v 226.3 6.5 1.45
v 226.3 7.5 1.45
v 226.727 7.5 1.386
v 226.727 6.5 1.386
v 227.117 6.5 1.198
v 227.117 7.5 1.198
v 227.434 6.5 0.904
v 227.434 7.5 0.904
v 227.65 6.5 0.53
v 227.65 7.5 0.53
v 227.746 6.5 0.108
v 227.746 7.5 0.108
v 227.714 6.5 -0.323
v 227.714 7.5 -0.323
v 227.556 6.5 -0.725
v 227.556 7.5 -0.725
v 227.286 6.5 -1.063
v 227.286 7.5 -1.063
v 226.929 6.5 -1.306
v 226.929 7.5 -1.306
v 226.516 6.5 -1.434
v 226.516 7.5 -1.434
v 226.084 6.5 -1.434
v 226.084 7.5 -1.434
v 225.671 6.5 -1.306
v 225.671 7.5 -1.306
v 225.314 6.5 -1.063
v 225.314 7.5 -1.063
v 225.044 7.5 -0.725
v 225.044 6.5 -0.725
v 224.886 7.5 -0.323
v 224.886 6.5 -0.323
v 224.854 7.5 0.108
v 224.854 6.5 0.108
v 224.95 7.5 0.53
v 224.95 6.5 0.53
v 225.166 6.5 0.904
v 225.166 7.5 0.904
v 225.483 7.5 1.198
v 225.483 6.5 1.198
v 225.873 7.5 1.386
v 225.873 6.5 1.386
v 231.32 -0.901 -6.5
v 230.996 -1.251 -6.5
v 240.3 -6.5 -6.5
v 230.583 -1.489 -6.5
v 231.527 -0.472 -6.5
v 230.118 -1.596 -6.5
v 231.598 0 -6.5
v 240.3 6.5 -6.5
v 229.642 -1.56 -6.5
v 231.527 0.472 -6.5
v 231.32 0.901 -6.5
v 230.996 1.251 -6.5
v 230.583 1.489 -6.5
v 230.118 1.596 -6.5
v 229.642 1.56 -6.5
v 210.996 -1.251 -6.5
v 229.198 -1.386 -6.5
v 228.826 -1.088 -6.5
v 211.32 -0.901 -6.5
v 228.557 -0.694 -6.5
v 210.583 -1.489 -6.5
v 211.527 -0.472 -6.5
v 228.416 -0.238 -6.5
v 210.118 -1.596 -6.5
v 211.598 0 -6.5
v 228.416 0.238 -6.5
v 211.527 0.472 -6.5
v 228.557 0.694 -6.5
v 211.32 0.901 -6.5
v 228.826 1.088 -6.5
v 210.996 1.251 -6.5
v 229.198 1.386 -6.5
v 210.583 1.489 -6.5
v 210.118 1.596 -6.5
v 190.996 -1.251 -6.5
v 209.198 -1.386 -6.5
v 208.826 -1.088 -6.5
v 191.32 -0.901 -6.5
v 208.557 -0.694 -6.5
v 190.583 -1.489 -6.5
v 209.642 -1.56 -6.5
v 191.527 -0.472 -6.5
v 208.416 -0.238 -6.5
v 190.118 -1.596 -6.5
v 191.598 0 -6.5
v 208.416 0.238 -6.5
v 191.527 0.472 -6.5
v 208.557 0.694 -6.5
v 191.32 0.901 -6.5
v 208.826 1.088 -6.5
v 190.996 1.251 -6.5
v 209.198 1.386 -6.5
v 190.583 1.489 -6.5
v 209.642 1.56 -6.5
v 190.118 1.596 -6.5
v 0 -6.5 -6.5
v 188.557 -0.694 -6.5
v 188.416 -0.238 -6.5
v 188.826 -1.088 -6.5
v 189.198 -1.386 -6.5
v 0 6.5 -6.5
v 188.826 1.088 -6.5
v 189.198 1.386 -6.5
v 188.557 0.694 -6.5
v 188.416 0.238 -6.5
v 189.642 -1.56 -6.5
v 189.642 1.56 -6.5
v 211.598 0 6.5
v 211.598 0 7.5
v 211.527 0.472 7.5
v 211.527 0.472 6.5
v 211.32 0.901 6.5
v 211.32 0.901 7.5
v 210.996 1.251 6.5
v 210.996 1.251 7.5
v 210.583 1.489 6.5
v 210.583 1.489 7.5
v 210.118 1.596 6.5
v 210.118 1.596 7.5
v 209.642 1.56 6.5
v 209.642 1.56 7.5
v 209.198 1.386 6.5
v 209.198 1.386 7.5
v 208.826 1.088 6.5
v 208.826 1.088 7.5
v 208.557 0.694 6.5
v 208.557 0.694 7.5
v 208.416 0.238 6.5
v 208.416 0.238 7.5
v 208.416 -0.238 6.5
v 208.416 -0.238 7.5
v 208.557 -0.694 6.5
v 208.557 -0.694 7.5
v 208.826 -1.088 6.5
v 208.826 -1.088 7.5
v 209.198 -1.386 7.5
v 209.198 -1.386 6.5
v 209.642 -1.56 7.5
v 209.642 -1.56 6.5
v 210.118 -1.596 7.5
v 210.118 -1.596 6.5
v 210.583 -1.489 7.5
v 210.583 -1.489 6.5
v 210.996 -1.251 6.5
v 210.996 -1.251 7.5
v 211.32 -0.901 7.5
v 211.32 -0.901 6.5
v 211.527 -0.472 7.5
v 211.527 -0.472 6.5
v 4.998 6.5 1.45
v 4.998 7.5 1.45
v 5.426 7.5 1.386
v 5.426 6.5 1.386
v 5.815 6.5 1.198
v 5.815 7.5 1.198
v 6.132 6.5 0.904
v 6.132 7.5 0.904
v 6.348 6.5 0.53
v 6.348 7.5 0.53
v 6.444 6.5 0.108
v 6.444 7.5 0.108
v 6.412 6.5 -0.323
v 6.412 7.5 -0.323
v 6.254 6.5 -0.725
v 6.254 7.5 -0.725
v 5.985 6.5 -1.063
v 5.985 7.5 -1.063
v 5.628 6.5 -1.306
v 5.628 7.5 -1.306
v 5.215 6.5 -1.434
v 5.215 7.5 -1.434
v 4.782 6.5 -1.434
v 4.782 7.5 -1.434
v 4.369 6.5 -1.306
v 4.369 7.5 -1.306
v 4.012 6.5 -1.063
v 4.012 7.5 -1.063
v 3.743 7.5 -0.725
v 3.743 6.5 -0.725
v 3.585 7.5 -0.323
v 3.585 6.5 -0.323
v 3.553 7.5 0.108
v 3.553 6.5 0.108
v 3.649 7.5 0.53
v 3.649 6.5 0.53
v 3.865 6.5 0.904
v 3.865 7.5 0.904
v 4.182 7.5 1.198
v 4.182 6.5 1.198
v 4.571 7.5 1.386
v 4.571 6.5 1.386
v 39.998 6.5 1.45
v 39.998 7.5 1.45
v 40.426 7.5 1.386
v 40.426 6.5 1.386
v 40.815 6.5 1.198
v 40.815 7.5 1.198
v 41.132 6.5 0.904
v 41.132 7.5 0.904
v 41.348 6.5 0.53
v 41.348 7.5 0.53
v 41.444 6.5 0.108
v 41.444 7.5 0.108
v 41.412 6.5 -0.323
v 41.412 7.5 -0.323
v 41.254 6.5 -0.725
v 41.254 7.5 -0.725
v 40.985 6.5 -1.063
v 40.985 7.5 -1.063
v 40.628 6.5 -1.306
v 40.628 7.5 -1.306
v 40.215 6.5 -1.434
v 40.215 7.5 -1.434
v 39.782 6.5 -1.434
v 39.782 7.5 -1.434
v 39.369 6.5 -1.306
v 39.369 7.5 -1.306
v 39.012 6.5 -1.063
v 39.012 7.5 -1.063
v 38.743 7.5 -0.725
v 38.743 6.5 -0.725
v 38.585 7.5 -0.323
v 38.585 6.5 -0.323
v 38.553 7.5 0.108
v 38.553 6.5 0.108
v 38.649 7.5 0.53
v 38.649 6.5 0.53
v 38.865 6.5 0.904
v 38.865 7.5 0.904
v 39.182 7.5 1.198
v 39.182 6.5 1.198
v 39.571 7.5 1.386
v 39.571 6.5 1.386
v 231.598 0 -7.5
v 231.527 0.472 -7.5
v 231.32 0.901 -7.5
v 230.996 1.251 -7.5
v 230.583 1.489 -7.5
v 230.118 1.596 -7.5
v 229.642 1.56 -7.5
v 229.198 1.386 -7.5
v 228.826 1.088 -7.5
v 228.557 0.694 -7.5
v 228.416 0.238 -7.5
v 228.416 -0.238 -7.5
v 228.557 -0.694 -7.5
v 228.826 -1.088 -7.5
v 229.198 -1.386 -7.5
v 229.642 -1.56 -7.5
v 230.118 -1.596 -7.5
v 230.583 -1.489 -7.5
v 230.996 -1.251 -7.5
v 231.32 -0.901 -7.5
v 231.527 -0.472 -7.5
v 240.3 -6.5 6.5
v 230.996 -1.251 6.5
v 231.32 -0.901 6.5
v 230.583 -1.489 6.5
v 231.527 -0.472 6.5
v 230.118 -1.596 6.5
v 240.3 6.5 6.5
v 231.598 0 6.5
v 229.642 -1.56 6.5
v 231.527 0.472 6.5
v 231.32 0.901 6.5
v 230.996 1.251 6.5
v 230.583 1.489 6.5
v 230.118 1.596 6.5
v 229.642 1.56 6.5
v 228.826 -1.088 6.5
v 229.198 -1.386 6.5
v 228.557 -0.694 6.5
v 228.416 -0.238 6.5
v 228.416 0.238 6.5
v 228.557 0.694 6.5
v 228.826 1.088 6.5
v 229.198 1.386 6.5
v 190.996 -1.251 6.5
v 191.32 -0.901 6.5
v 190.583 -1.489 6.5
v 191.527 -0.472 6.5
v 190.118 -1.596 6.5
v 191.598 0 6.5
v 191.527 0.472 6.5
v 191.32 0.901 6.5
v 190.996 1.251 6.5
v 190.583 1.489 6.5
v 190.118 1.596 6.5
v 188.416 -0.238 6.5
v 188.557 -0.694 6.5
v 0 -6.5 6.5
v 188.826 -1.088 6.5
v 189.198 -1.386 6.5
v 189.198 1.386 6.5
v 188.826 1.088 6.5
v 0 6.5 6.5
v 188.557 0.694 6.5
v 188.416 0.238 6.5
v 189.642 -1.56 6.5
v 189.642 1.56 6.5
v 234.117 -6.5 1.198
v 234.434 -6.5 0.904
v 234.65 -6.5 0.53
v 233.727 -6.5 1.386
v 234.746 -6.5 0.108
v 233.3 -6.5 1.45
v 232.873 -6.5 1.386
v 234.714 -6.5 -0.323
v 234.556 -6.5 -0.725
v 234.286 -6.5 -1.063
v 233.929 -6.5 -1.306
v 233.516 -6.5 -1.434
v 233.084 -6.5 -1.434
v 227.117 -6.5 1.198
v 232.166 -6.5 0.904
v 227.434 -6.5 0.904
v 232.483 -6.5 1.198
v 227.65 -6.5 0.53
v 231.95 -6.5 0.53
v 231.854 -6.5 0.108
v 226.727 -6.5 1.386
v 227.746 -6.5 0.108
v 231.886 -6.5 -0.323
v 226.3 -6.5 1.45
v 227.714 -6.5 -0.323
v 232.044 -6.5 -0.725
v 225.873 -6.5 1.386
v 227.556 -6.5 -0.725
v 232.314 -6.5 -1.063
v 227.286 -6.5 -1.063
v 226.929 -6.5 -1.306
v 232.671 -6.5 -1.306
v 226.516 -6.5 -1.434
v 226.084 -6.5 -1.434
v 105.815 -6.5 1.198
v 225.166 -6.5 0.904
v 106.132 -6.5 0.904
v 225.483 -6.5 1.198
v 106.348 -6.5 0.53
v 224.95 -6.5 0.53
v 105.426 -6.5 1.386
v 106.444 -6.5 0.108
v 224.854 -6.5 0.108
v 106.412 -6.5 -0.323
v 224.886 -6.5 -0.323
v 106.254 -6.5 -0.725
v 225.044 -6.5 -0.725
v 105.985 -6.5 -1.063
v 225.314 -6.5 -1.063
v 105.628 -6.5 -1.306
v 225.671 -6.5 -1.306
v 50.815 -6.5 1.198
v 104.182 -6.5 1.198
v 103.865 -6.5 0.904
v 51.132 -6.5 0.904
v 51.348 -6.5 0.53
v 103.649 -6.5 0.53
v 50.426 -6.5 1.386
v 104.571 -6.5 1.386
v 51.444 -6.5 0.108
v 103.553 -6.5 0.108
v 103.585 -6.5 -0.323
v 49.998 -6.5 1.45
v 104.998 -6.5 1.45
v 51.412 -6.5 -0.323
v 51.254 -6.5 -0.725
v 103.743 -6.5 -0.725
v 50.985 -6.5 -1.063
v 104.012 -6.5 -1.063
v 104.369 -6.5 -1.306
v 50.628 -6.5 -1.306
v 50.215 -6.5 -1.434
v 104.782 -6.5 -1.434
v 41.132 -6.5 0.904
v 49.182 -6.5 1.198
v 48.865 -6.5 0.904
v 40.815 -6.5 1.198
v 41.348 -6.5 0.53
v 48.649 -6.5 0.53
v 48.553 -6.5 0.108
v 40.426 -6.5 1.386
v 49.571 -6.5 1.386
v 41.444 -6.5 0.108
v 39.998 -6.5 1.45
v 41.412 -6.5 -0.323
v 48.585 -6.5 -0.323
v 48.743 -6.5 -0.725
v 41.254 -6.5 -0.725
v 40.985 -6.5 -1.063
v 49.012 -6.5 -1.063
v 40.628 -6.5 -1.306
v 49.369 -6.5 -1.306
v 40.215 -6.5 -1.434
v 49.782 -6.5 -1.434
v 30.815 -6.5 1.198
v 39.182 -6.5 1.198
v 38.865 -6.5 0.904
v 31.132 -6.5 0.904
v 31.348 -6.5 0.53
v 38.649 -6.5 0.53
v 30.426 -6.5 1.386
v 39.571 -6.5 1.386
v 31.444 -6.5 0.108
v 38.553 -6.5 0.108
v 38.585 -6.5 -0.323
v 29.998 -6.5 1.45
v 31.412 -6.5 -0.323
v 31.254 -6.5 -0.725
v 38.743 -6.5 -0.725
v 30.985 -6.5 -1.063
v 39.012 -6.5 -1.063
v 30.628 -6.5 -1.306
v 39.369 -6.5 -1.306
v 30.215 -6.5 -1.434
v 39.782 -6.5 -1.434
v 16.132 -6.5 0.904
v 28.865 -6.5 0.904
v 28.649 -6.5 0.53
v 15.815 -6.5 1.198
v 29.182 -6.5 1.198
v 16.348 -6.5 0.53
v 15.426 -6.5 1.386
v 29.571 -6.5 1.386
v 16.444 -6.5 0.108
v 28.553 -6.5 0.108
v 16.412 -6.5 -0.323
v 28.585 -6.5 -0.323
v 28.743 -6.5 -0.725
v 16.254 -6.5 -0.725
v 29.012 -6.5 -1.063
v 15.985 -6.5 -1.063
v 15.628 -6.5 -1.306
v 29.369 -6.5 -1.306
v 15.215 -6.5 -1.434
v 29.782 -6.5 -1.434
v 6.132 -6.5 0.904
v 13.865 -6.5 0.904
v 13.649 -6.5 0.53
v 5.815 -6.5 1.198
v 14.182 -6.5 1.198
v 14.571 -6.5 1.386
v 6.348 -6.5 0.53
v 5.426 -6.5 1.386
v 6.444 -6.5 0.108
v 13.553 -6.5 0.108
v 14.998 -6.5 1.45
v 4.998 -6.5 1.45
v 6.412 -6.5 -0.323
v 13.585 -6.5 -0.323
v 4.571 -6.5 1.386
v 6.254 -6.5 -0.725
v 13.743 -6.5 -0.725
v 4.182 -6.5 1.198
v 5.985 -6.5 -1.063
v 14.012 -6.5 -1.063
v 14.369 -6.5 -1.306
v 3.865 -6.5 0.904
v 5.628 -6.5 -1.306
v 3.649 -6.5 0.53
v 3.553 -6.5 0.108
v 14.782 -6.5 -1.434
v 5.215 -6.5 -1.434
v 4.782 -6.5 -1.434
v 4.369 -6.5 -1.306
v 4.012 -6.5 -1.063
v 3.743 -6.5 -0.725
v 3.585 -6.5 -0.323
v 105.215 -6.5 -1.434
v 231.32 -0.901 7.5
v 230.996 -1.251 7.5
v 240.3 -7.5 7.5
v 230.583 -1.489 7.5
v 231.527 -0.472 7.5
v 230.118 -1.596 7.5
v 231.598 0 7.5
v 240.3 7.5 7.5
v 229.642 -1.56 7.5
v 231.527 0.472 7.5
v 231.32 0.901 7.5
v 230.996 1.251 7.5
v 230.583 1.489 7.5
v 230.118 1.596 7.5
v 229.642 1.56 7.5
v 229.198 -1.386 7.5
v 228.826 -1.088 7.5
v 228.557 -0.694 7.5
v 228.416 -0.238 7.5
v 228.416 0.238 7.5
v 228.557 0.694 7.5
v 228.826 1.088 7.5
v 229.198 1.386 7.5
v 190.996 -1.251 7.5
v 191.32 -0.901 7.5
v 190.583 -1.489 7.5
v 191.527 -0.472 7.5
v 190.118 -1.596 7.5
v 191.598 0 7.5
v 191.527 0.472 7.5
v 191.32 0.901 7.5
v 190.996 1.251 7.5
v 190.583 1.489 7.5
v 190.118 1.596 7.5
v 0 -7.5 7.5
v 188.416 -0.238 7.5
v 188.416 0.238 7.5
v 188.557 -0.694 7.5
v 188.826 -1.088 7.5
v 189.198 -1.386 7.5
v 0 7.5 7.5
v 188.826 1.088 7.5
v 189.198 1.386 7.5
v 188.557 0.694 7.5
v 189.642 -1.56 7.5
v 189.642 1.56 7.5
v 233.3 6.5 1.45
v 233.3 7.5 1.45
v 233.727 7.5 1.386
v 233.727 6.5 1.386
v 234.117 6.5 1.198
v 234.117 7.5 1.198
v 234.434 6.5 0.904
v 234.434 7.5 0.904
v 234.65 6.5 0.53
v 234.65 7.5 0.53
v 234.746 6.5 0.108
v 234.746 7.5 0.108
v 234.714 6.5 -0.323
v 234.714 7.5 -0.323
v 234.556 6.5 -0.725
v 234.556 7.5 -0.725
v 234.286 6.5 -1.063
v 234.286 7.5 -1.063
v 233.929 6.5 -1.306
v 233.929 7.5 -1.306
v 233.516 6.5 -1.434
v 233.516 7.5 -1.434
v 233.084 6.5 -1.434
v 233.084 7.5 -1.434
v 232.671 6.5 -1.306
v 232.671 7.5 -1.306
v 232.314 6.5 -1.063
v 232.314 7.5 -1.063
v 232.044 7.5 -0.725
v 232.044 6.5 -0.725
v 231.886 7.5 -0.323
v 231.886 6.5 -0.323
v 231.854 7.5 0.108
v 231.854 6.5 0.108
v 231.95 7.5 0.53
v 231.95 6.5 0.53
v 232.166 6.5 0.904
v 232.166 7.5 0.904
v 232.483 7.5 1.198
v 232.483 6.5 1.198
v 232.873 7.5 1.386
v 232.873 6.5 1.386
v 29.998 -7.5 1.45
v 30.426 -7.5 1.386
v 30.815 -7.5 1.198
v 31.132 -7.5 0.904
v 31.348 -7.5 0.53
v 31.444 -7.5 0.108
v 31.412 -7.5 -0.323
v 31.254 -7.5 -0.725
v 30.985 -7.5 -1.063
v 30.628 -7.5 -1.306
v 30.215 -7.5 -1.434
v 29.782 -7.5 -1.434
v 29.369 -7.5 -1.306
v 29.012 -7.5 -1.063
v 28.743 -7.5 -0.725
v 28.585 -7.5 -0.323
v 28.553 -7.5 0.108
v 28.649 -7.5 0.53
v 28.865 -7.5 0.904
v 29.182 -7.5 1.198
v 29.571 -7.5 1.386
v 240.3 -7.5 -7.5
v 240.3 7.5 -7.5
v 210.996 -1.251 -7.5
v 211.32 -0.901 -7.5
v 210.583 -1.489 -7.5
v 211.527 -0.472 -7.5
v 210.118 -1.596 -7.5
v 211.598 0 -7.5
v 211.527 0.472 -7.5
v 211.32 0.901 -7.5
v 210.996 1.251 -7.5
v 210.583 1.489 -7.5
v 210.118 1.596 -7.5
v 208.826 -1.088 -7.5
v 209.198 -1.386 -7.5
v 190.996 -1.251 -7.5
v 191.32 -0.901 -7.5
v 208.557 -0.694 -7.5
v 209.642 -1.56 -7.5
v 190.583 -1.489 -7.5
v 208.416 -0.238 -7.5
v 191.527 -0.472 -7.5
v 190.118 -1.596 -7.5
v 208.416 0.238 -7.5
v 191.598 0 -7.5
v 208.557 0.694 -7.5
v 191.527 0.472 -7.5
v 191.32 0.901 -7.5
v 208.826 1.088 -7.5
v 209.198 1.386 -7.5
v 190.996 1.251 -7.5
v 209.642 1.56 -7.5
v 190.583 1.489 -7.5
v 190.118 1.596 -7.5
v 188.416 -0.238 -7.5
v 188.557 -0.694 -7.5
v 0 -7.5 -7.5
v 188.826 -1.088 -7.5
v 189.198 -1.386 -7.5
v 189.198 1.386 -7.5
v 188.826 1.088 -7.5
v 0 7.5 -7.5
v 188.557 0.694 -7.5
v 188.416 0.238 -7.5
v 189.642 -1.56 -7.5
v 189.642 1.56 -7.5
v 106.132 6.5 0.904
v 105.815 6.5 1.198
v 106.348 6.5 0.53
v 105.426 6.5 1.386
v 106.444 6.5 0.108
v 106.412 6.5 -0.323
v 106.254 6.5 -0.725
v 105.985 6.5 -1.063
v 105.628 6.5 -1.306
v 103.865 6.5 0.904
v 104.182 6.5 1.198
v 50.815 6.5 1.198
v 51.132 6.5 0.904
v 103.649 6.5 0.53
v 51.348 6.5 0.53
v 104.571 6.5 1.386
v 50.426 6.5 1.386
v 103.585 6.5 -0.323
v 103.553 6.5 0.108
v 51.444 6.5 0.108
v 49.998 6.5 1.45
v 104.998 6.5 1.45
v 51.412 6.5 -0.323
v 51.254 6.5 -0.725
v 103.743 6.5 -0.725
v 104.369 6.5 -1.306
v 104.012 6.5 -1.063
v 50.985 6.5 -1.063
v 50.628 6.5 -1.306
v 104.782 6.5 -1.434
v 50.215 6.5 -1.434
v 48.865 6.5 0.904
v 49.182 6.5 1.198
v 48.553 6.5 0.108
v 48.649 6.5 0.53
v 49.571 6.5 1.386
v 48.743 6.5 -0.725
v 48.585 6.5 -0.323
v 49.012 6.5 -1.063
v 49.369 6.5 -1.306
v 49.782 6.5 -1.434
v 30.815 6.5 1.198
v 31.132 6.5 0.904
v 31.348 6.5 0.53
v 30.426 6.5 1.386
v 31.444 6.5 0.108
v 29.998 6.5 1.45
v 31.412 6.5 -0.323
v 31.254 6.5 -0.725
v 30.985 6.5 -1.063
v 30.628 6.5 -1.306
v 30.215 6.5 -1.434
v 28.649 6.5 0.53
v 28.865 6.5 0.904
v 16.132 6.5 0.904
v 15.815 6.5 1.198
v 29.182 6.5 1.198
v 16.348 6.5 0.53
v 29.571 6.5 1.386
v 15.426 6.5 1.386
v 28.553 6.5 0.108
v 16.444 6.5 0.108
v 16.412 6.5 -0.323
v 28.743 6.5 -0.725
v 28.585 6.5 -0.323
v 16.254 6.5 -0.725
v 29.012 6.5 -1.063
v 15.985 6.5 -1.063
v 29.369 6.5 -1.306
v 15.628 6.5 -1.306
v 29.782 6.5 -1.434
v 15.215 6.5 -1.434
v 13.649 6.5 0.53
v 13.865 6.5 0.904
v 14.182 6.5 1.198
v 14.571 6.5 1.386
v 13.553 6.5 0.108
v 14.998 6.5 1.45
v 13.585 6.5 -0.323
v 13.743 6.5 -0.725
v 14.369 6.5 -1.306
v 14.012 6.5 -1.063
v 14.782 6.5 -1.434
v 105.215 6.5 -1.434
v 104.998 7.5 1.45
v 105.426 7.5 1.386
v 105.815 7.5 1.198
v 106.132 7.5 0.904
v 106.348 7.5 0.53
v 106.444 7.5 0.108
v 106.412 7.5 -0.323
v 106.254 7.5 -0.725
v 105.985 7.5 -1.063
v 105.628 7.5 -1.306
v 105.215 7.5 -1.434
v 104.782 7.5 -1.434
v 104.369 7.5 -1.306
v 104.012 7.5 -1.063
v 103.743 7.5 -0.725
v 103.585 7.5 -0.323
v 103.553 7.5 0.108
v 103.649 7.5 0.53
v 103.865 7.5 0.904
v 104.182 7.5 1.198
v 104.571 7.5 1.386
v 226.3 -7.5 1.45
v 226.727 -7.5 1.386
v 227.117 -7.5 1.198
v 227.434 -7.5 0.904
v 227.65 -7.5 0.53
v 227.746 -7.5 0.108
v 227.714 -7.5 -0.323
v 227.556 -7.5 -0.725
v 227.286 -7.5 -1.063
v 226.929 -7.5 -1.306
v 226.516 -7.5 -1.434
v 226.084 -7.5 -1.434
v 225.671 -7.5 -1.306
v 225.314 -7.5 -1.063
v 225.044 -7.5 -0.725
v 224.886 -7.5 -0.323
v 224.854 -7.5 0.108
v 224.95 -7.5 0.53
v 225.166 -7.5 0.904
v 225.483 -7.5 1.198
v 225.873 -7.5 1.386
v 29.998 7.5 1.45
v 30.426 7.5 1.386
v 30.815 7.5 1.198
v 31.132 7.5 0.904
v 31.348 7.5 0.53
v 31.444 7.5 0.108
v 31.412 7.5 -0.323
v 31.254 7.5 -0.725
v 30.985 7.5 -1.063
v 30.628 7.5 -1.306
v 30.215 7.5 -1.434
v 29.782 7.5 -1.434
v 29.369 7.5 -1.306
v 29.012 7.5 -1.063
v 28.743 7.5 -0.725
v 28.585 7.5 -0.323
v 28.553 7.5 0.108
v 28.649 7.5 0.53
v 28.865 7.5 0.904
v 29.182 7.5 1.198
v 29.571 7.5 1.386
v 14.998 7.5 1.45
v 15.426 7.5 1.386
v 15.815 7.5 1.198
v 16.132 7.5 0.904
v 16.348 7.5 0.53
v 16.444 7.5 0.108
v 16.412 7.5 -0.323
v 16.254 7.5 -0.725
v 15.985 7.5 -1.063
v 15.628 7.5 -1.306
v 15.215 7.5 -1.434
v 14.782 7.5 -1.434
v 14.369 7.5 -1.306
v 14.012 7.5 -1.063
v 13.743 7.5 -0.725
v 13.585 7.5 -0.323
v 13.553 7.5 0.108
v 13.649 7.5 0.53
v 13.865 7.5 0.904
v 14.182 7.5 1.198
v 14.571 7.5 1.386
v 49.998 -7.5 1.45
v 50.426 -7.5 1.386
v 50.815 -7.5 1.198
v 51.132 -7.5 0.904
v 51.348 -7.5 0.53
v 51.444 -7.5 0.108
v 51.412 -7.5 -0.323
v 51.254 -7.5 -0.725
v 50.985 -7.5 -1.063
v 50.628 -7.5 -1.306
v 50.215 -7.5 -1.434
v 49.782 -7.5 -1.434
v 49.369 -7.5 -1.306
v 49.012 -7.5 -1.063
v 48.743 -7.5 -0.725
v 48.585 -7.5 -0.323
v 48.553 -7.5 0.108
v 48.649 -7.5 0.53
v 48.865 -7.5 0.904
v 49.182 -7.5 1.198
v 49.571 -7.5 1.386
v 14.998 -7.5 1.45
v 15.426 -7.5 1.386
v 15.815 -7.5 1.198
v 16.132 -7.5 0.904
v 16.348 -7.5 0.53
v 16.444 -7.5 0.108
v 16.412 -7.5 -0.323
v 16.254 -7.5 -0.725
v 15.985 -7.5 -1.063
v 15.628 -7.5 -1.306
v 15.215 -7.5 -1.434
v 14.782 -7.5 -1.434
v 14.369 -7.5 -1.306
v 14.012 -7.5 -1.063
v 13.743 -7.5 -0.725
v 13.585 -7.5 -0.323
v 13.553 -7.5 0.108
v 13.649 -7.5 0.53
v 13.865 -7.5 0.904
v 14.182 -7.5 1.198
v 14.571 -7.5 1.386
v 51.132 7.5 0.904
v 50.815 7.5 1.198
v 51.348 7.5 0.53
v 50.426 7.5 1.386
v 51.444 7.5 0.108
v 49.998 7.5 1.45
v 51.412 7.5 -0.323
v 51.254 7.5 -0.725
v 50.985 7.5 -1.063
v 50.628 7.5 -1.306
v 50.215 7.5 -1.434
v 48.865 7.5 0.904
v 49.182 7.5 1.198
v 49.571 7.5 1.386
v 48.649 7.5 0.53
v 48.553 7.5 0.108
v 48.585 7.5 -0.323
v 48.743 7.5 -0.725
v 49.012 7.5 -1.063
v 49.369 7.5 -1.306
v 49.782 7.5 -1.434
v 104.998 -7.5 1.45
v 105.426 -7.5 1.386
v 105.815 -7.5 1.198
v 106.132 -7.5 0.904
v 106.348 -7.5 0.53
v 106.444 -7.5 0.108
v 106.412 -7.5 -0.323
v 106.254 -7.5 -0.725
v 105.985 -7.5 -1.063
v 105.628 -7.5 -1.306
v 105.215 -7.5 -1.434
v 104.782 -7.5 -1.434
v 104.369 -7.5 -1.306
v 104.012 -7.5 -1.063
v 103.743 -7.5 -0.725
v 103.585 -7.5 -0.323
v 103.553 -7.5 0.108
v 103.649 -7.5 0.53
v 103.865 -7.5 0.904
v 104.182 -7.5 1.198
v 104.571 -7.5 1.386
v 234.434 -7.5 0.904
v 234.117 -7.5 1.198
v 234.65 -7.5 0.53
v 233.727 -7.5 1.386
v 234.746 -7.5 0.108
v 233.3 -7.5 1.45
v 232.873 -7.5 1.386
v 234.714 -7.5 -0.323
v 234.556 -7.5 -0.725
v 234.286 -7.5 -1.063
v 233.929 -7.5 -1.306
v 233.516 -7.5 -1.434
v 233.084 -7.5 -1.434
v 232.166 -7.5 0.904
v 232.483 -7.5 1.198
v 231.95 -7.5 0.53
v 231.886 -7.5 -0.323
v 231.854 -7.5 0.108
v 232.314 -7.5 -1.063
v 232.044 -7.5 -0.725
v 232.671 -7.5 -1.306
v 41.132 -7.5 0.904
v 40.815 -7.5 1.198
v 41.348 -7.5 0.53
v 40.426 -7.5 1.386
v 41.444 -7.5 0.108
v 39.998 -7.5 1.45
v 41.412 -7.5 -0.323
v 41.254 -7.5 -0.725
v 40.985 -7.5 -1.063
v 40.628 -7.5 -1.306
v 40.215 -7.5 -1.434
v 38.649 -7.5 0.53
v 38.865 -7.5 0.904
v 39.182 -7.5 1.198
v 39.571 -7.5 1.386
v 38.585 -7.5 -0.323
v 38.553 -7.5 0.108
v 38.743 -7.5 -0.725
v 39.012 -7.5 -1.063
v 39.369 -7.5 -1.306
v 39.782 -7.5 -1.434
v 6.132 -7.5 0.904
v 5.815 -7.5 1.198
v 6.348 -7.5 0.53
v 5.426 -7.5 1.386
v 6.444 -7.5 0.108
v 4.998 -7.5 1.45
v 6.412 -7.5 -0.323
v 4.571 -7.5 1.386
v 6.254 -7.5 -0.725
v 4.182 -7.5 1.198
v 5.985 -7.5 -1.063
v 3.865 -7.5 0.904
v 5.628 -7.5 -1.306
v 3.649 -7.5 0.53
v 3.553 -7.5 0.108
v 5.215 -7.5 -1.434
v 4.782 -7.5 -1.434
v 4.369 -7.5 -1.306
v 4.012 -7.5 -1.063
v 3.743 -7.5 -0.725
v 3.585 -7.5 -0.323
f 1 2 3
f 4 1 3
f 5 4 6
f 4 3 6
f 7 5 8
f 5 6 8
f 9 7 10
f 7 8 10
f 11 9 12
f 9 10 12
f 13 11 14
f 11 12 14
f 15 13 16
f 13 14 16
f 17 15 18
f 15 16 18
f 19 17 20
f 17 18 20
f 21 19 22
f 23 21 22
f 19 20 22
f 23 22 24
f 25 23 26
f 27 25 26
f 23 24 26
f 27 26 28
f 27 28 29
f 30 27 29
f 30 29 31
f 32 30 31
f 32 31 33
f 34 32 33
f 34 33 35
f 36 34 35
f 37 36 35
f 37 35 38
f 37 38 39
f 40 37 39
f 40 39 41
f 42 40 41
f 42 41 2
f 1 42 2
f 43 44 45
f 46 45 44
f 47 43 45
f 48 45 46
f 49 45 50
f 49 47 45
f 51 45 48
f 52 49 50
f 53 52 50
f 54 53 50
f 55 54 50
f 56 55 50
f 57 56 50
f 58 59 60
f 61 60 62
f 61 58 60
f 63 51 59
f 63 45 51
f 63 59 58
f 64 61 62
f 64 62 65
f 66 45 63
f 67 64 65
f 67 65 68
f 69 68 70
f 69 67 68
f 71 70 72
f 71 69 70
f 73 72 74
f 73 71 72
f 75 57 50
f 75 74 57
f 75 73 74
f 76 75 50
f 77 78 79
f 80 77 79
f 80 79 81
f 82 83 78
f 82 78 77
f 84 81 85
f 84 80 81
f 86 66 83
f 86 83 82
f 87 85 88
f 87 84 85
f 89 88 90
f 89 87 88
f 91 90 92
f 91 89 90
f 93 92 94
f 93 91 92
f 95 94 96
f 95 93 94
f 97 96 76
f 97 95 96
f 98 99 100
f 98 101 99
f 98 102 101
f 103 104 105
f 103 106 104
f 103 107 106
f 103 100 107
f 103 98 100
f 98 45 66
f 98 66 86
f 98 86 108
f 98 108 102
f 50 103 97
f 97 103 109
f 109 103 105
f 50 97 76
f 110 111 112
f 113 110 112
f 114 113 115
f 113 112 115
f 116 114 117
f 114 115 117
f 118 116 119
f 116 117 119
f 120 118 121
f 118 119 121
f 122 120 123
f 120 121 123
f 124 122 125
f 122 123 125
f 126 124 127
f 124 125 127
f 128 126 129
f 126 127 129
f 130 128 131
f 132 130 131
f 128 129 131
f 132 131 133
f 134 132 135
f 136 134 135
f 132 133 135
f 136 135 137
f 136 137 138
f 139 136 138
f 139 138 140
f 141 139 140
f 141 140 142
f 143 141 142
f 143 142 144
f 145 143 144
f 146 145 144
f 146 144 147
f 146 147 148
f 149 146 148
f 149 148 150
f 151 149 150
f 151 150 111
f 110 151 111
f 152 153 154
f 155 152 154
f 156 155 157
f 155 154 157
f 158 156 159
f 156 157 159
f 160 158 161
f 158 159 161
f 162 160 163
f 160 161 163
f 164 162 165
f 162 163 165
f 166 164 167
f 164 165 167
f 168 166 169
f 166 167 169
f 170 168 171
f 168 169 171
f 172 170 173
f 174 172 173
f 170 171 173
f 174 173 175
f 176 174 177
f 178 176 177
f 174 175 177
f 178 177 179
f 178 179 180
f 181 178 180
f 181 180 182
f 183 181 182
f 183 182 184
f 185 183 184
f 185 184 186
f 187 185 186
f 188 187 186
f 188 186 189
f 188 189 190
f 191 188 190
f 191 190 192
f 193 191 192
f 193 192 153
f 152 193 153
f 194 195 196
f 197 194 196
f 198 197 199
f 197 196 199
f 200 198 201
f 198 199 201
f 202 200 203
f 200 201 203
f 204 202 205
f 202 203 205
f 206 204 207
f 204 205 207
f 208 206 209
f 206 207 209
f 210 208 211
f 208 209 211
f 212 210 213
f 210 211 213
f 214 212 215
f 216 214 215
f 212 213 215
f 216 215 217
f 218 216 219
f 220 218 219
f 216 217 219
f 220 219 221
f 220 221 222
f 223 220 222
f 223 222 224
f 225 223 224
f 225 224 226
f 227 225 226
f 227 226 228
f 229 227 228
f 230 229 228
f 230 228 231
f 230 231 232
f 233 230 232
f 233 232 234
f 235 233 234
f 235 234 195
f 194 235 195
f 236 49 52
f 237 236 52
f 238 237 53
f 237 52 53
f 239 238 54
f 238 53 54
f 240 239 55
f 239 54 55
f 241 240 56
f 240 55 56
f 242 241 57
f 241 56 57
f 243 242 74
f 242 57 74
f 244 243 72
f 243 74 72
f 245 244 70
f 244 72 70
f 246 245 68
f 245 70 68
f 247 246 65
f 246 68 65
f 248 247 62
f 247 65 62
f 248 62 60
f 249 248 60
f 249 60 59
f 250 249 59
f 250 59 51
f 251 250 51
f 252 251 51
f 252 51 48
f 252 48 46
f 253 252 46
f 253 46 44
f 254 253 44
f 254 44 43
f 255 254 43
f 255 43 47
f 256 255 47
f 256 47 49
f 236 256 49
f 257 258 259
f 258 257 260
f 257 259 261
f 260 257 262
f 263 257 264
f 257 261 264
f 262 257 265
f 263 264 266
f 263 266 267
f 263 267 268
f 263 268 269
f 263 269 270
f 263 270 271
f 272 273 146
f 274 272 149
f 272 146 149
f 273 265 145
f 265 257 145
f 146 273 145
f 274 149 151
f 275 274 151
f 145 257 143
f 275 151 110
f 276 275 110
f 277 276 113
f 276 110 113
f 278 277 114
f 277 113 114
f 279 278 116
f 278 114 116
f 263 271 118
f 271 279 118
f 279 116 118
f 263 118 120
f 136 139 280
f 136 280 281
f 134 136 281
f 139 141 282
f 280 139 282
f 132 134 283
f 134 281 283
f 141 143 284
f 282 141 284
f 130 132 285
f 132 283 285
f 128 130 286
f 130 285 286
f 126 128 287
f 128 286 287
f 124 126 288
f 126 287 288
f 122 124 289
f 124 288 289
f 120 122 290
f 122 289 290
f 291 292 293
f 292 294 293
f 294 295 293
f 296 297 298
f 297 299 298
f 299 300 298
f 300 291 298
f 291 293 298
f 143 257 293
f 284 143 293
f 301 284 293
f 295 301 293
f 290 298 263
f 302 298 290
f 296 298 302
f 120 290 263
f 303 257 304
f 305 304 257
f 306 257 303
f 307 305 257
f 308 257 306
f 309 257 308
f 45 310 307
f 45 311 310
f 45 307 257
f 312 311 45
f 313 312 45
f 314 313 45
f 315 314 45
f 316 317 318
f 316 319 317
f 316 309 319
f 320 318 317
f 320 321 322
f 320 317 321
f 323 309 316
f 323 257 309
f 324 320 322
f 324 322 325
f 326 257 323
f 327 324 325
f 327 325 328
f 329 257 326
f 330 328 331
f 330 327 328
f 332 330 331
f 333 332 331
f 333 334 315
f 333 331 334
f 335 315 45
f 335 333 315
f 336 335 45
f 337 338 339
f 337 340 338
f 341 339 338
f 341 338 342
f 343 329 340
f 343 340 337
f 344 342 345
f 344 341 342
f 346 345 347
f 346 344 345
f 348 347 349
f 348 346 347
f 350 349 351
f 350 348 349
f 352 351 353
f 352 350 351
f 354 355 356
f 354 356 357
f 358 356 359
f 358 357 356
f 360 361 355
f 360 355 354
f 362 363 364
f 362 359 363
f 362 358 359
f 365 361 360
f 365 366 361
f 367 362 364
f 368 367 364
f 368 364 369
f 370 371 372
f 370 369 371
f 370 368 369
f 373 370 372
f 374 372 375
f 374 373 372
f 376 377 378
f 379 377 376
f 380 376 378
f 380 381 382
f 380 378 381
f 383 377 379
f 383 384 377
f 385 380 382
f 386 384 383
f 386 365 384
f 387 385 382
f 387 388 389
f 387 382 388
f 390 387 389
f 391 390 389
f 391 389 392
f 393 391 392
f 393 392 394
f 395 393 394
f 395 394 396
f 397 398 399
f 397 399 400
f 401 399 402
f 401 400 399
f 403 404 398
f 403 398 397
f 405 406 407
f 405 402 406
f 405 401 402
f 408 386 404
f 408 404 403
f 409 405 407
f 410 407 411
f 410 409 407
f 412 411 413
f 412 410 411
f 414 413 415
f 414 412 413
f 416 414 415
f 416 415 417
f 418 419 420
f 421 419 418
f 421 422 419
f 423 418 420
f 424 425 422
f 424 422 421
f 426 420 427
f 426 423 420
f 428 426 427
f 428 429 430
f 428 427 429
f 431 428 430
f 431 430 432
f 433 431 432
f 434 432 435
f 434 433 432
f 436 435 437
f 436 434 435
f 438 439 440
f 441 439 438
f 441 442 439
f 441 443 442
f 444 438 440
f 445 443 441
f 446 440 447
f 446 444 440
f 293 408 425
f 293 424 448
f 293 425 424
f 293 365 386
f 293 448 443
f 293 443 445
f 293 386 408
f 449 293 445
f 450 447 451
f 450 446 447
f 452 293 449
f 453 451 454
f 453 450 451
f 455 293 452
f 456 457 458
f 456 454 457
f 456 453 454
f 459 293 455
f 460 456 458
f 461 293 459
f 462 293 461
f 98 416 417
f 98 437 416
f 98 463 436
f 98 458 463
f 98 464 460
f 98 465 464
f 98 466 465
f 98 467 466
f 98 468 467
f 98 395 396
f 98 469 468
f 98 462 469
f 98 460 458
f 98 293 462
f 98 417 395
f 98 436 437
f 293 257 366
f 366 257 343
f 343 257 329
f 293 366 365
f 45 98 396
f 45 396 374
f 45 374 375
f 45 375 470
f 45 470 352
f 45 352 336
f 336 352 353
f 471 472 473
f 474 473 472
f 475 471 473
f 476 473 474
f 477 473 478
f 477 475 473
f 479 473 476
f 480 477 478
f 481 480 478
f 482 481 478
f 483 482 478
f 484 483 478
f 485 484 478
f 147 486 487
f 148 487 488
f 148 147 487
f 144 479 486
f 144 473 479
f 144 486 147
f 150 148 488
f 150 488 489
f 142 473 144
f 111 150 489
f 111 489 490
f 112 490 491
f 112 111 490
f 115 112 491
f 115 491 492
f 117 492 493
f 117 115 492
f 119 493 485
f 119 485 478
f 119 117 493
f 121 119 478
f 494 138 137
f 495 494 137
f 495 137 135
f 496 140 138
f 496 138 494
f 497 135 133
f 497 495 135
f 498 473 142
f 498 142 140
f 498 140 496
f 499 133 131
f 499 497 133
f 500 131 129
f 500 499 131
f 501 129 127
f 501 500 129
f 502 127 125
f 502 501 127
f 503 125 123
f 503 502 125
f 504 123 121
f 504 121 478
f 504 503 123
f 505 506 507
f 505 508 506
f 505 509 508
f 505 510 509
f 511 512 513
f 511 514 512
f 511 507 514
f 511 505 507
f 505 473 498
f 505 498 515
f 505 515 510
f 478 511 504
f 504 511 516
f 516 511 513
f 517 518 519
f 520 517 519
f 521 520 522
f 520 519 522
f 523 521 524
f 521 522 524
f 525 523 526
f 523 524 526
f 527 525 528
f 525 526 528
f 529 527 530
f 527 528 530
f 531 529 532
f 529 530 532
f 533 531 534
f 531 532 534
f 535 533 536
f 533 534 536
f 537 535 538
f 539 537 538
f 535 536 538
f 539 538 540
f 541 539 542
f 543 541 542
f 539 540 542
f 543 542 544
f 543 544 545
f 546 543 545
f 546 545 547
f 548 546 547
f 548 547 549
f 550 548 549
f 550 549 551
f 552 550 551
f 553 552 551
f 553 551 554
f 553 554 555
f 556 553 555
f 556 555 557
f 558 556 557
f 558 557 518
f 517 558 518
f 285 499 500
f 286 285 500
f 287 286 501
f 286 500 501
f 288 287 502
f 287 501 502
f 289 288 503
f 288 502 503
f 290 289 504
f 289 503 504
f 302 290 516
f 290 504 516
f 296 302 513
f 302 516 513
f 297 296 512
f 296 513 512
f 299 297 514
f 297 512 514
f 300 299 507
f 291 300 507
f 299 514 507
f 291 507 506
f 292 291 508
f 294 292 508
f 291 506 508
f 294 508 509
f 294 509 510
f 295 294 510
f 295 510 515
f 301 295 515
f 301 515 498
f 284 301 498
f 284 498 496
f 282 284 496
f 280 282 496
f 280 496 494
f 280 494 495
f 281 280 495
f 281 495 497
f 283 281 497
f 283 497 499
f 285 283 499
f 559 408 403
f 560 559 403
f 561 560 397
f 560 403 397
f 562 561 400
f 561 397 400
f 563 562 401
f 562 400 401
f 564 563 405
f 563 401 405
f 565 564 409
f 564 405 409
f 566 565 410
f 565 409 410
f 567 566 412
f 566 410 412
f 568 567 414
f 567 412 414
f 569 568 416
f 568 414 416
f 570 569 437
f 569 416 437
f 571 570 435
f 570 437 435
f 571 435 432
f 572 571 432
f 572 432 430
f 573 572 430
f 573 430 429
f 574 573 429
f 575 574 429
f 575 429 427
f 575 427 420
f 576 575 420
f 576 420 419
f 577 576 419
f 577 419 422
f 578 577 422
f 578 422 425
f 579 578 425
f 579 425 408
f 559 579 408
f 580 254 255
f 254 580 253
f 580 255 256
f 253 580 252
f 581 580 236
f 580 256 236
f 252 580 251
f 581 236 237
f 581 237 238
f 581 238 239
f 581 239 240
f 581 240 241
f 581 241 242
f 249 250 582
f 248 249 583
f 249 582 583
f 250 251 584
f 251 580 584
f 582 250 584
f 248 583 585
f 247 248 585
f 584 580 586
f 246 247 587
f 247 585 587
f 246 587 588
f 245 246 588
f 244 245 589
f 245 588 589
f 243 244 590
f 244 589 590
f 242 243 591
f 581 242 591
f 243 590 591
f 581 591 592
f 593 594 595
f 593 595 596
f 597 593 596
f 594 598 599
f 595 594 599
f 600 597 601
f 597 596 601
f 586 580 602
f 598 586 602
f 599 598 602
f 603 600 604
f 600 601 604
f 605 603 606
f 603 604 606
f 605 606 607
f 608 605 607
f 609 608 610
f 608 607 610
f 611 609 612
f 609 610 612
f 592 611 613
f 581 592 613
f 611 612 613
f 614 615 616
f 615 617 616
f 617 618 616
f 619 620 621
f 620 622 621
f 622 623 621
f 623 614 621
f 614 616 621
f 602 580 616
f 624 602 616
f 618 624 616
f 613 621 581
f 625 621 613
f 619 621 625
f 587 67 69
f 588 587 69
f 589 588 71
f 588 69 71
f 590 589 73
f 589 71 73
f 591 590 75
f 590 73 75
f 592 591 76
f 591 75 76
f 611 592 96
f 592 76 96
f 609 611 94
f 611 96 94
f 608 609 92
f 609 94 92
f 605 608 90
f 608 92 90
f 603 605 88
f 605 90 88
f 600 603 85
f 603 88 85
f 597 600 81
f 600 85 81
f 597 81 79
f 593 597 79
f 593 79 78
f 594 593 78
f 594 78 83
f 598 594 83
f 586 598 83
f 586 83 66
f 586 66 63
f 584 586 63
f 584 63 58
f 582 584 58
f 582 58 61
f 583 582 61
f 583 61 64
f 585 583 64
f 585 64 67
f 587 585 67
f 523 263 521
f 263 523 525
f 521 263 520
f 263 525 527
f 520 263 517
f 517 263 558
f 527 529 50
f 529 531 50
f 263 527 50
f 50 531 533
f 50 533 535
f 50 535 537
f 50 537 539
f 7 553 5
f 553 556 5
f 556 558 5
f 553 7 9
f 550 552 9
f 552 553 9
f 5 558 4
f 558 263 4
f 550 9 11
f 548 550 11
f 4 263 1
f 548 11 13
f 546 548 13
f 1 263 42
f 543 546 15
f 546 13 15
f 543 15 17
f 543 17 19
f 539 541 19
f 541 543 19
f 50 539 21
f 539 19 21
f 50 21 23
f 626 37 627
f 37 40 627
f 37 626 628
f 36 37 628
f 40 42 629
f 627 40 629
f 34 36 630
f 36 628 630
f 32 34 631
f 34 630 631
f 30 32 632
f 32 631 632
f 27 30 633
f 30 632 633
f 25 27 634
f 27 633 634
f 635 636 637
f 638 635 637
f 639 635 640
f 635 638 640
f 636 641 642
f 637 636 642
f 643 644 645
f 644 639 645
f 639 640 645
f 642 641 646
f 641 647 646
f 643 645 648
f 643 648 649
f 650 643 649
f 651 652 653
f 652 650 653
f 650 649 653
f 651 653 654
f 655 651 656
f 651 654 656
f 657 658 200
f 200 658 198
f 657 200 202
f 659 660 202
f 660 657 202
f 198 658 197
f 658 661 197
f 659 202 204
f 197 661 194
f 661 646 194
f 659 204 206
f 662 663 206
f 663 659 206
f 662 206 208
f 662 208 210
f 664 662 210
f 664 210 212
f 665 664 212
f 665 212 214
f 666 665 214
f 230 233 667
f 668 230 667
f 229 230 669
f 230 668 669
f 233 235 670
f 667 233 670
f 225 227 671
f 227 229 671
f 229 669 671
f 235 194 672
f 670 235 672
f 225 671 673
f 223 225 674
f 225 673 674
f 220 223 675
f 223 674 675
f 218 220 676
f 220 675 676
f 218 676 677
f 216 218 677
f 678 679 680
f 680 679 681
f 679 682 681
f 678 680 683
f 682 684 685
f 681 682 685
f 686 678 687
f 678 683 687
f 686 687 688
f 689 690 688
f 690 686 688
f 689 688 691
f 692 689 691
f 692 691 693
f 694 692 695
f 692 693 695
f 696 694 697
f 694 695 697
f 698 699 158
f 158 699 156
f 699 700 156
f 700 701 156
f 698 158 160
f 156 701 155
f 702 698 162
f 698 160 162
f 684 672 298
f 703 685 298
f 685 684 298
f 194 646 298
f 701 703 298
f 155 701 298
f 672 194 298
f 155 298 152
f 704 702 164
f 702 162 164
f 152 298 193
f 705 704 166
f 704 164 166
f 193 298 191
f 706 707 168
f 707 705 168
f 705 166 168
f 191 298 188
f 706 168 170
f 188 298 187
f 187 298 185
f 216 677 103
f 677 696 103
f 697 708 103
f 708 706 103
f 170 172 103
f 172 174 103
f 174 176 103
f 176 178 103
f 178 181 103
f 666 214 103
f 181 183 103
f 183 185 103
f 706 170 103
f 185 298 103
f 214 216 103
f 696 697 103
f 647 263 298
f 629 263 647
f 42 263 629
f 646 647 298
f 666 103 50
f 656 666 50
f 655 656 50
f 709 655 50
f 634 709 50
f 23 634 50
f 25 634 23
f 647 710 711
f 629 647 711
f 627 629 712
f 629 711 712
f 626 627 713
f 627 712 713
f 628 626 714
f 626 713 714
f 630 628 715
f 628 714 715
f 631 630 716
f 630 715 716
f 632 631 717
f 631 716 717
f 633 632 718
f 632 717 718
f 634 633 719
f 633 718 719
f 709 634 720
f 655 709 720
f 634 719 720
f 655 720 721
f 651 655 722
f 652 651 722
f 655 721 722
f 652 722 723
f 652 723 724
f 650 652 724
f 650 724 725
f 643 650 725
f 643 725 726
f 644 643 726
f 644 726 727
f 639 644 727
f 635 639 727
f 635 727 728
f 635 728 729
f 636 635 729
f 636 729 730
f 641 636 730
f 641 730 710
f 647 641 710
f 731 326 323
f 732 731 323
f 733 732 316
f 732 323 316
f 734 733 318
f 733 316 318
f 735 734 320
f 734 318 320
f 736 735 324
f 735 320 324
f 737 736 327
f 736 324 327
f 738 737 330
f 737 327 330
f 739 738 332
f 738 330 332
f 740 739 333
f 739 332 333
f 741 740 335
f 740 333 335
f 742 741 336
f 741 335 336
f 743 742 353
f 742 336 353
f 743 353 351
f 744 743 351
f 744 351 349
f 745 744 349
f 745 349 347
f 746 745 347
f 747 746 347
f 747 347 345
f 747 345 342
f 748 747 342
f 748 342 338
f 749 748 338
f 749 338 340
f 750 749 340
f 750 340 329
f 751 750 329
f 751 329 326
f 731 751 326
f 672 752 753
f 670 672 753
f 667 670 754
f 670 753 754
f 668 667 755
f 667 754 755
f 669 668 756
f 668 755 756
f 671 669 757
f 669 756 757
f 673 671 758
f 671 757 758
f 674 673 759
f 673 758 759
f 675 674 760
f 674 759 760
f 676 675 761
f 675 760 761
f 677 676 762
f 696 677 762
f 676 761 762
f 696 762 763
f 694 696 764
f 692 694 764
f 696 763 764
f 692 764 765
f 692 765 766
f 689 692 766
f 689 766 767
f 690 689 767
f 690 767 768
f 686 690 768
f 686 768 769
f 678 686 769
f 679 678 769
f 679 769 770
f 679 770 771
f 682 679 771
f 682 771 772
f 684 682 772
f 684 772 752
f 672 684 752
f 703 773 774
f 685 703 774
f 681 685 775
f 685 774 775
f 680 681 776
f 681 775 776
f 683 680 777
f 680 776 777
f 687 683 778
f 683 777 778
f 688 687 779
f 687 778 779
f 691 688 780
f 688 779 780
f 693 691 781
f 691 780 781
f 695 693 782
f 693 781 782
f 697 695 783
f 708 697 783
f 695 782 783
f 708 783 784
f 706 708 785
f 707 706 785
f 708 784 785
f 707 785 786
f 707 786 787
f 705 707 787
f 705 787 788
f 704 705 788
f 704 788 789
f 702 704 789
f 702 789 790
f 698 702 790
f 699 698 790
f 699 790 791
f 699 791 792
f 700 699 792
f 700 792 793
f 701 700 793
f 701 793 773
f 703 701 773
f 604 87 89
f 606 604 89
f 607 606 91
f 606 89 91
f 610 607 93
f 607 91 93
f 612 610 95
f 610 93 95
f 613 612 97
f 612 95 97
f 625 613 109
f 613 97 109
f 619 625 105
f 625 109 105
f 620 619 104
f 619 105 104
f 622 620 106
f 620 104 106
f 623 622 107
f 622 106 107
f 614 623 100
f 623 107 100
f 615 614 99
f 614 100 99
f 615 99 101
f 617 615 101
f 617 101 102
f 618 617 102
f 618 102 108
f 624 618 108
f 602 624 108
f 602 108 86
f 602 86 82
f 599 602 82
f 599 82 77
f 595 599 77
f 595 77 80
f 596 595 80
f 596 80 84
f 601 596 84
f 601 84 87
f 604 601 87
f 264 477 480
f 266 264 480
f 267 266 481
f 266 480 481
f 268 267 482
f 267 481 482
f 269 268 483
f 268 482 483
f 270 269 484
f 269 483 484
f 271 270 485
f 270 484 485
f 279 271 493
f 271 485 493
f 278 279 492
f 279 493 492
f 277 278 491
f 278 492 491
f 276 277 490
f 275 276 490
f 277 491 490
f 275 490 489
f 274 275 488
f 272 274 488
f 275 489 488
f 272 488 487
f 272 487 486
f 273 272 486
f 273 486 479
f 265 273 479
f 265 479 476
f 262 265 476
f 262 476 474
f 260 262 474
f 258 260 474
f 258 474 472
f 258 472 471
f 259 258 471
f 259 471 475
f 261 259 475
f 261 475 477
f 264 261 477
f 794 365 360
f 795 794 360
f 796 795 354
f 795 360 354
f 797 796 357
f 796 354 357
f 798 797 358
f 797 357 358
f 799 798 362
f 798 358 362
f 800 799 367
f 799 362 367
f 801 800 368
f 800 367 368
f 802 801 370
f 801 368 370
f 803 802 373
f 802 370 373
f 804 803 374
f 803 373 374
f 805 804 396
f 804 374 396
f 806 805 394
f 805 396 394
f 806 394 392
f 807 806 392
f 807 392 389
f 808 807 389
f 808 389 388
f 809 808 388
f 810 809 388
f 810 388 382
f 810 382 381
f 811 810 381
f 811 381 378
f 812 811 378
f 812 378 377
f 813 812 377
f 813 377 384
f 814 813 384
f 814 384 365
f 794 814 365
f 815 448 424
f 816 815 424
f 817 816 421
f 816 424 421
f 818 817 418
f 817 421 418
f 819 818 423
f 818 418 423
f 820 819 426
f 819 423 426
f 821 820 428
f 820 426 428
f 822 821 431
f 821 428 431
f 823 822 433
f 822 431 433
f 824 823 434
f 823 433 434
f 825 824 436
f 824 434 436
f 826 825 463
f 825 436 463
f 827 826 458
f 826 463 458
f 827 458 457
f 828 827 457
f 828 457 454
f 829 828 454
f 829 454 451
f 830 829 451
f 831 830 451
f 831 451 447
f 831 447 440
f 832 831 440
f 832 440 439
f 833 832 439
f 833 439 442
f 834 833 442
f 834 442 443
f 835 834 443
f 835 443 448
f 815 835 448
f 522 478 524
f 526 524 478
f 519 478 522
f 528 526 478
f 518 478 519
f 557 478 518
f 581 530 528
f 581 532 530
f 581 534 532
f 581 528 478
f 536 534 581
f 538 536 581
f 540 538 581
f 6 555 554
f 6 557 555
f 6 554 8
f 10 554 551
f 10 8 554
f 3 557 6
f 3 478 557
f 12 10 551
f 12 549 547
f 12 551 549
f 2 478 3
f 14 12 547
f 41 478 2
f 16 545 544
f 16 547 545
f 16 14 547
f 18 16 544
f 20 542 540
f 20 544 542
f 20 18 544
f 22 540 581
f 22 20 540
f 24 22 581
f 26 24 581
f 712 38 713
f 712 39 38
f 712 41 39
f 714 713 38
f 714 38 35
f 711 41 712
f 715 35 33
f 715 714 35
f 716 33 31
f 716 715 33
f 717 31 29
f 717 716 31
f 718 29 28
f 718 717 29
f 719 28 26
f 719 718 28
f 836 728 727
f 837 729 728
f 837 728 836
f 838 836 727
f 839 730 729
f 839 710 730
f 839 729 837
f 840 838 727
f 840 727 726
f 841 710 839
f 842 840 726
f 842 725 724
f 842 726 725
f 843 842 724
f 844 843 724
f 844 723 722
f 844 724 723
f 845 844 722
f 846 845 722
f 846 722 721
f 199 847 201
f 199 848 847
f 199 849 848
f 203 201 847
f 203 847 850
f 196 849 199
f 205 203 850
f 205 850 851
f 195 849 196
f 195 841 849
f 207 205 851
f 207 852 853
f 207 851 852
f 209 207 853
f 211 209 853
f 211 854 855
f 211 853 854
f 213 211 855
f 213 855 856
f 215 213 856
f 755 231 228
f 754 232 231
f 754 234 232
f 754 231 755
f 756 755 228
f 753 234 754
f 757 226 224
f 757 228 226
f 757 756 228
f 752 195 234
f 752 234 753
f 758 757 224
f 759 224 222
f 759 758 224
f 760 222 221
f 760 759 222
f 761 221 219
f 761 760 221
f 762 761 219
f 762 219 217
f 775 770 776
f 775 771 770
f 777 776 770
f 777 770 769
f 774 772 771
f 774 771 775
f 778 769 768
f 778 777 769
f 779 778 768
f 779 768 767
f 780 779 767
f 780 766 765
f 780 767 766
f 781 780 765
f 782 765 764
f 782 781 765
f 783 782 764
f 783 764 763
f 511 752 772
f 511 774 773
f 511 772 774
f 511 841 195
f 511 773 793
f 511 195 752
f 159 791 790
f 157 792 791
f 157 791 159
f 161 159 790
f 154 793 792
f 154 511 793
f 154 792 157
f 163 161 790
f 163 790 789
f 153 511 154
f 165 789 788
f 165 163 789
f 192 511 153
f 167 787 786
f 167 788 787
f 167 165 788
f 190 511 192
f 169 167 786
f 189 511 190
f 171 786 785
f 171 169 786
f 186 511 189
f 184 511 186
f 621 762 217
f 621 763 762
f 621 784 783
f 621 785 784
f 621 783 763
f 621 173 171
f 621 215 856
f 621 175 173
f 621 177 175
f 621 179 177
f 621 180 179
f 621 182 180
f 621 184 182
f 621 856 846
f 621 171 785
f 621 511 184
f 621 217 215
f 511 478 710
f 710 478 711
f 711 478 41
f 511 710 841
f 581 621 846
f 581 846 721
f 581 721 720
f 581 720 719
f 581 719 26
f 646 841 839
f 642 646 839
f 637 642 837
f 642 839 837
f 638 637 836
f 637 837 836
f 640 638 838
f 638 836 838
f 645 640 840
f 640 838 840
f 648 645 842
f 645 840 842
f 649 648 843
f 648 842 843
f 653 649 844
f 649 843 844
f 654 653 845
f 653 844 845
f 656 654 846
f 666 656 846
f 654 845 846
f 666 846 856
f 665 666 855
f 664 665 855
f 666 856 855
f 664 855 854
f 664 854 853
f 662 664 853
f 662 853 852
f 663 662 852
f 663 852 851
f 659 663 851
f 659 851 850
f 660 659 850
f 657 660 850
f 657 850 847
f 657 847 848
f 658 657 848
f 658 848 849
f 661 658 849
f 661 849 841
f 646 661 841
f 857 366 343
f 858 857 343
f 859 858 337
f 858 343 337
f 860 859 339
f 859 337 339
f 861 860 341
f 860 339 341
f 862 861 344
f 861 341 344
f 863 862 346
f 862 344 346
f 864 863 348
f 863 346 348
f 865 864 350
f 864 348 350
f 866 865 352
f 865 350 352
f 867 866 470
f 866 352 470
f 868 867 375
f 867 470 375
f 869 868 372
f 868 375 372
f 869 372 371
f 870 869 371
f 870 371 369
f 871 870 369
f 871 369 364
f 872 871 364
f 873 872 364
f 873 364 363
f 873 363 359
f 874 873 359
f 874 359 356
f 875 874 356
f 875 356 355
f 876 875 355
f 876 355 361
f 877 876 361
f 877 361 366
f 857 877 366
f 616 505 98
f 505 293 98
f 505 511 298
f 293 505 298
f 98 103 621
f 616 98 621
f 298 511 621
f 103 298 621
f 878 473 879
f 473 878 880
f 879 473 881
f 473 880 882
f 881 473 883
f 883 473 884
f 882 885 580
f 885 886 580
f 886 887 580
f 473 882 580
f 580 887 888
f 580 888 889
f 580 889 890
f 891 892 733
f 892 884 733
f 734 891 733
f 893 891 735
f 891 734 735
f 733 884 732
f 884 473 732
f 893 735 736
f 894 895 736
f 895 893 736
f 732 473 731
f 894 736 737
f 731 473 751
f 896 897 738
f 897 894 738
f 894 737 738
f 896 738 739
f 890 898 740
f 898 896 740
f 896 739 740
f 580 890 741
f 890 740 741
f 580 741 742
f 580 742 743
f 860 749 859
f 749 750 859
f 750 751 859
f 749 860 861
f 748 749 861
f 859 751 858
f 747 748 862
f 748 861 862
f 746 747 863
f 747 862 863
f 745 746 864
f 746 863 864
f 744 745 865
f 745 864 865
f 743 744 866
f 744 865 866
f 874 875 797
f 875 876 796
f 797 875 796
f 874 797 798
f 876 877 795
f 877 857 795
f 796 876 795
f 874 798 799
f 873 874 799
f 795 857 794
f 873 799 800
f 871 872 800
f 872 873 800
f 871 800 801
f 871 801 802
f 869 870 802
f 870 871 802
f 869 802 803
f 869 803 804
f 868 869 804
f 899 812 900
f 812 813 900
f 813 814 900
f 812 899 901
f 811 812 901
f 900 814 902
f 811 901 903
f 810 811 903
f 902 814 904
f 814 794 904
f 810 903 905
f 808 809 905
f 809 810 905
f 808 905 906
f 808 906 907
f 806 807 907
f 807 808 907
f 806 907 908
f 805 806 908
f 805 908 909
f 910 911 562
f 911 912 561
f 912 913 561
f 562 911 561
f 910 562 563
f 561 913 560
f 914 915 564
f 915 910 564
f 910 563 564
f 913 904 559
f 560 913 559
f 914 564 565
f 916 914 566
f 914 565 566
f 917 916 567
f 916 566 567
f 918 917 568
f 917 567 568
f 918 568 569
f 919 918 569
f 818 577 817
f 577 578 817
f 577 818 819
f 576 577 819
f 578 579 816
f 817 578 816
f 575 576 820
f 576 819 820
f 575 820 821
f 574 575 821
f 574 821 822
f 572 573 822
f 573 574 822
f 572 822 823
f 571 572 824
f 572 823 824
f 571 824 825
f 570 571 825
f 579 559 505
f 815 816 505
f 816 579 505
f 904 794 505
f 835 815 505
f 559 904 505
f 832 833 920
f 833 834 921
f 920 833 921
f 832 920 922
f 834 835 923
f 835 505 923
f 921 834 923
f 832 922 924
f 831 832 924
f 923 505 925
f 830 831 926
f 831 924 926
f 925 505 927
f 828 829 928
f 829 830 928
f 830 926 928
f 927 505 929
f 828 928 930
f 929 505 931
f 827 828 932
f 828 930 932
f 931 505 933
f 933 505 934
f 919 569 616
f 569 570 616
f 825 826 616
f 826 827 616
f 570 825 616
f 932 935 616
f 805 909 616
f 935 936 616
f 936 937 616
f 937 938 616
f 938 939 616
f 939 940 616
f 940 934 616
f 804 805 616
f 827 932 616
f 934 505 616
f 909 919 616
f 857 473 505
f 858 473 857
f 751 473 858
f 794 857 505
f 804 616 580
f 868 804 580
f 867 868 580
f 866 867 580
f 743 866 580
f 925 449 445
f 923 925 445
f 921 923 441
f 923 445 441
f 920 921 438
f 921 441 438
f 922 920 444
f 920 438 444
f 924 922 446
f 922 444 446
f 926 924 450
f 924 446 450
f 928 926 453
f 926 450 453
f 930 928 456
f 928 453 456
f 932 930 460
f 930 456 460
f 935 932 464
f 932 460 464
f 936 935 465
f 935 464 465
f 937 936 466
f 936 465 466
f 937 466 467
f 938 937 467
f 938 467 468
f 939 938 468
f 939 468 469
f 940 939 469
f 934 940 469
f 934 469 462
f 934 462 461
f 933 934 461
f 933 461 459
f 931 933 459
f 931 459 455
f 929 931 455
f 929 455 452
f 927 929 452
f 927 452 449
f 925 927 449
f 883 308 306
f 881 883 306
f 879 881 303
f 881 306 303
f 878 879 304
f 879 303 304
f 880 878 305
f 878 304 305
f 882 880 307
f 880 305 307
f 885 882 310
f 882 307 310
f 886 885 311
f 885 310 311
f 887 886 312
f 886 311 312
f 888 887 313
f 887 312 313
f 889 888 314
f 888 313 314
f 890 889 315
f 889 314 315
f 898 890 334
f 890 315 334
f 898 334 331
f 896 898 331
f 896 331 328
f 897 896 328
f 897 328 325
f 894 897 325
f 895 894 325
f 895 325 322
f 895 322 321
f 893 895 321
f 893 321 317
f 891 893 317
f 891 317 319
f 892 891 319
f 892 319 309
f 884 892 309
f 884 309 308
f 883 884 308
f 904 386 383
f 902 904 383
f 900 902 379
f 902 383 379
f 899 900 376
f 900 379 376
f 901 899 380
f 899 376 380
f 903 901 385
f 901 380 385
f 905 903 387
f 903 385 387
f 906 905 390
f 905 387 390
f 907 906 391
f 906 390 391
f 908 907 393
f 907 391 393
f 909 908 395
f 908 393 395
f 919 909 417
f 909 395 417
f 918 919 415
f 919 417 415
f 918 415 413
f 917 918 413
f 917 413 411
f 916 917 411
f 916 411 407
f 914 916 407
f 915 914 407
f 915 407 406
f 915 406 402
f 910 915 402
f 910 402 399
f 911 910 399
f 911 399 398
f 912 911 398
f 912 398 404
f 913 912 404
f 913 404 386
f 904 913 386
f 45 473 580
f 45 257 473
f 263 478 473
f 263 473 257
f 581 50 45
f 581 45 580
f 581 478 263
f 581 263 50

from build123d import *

# Parameters (mm, degrees)
SKETCH_1_W          = 15
SKETCH_1_H          = 15
SKETCH_1_W_2        = 13
SKETCH_1_H_2        = 13
EXTRUDE_1_DEPTH     = 240.3
SKETCH_2_R          = 1.45
CUT_EXTRUDE_1_DEPTH = 241.884495142
SKETCH_3_R          = 1.6
CUT_EXTRUDE_2_DEPTH = 241.884495142


with BuildPart() as part:
    # 草图1 → 凸台-拉伸1 (new body)
    with BuildSketch(Plane(origin=(0, 0, 0), x_dir=(0, 0, -1), z_dir=(1, 0, 0))):
        Rectangle(SKETCH_1_W, SKETCH_1_H)
        Rectangle(SKETCH_1_W_2, SKETCH_1_H_2, mode=Mode.SUBTRACT)
    extrude(amount=EXTRUDE_1_DEPTH)

    # 草图2 → 切除-拉伸1 (cut, through all)
    with BuildSketch(Plane(origin=(0, 7.5, 0), x_dir=(1, 0, 0), z_dir=(0, 1, 0))):
        with Locations(Location((233.3, 0, 0), (0, 0, 270))):
            Circle(SKETCH_2_R)
        with Locations(Location((226.3, 0, 0), (0, 0, 270))):
            Circle(SKETCH_2_R)
        with Locations(Location((14.99848481, 0, 0), (0, 0, 270))):
            Circle(SKETCH_2_R)
        with Locations(Location((4.99848481, 0, 0), (0, 0, 270))):
            Circle(SKETCH_2_R)
        with Locations(Location((29.99848481, 0, 0), (0, 0, 270))):
            Circle(SKETCH_2_R)
        with Locations(Location((39.99848481, 0, 0), (0, 0, 270))):
            Circle(SKETCH_2_R)
        with Locations(Location((49.99848481, 0, 0), (0, 0, 270))):
            Circle(SKETCH_2_R)
        with Locations(Location((104.99848481, 0, 0), (0, 0, 270))):
            Circle(SKETCH_2_R)
    extrude(amount=-CUT_EXTRUDE_1_DEPTH, mode=Mode.SUBTRACT)

    # 草图3 → 切除-拉伸2 (cut, through all)
    with BuildSketch(Plane.XY.offset(7.5)):
        with Locations((229.99848481, 0)):
            Circle(SKETCH_3_R)
        with Locations((189.99848481, 0)):
            Circle(SKETCH_3_R)
        with Locations((209.99848481, 0)):
            Circle(SKETCH_3_R)
    extrude(amount=-CUT_EXTRUDE_2_DEPTH, mode=Mode.SUBTRACT)


solid = part.part
